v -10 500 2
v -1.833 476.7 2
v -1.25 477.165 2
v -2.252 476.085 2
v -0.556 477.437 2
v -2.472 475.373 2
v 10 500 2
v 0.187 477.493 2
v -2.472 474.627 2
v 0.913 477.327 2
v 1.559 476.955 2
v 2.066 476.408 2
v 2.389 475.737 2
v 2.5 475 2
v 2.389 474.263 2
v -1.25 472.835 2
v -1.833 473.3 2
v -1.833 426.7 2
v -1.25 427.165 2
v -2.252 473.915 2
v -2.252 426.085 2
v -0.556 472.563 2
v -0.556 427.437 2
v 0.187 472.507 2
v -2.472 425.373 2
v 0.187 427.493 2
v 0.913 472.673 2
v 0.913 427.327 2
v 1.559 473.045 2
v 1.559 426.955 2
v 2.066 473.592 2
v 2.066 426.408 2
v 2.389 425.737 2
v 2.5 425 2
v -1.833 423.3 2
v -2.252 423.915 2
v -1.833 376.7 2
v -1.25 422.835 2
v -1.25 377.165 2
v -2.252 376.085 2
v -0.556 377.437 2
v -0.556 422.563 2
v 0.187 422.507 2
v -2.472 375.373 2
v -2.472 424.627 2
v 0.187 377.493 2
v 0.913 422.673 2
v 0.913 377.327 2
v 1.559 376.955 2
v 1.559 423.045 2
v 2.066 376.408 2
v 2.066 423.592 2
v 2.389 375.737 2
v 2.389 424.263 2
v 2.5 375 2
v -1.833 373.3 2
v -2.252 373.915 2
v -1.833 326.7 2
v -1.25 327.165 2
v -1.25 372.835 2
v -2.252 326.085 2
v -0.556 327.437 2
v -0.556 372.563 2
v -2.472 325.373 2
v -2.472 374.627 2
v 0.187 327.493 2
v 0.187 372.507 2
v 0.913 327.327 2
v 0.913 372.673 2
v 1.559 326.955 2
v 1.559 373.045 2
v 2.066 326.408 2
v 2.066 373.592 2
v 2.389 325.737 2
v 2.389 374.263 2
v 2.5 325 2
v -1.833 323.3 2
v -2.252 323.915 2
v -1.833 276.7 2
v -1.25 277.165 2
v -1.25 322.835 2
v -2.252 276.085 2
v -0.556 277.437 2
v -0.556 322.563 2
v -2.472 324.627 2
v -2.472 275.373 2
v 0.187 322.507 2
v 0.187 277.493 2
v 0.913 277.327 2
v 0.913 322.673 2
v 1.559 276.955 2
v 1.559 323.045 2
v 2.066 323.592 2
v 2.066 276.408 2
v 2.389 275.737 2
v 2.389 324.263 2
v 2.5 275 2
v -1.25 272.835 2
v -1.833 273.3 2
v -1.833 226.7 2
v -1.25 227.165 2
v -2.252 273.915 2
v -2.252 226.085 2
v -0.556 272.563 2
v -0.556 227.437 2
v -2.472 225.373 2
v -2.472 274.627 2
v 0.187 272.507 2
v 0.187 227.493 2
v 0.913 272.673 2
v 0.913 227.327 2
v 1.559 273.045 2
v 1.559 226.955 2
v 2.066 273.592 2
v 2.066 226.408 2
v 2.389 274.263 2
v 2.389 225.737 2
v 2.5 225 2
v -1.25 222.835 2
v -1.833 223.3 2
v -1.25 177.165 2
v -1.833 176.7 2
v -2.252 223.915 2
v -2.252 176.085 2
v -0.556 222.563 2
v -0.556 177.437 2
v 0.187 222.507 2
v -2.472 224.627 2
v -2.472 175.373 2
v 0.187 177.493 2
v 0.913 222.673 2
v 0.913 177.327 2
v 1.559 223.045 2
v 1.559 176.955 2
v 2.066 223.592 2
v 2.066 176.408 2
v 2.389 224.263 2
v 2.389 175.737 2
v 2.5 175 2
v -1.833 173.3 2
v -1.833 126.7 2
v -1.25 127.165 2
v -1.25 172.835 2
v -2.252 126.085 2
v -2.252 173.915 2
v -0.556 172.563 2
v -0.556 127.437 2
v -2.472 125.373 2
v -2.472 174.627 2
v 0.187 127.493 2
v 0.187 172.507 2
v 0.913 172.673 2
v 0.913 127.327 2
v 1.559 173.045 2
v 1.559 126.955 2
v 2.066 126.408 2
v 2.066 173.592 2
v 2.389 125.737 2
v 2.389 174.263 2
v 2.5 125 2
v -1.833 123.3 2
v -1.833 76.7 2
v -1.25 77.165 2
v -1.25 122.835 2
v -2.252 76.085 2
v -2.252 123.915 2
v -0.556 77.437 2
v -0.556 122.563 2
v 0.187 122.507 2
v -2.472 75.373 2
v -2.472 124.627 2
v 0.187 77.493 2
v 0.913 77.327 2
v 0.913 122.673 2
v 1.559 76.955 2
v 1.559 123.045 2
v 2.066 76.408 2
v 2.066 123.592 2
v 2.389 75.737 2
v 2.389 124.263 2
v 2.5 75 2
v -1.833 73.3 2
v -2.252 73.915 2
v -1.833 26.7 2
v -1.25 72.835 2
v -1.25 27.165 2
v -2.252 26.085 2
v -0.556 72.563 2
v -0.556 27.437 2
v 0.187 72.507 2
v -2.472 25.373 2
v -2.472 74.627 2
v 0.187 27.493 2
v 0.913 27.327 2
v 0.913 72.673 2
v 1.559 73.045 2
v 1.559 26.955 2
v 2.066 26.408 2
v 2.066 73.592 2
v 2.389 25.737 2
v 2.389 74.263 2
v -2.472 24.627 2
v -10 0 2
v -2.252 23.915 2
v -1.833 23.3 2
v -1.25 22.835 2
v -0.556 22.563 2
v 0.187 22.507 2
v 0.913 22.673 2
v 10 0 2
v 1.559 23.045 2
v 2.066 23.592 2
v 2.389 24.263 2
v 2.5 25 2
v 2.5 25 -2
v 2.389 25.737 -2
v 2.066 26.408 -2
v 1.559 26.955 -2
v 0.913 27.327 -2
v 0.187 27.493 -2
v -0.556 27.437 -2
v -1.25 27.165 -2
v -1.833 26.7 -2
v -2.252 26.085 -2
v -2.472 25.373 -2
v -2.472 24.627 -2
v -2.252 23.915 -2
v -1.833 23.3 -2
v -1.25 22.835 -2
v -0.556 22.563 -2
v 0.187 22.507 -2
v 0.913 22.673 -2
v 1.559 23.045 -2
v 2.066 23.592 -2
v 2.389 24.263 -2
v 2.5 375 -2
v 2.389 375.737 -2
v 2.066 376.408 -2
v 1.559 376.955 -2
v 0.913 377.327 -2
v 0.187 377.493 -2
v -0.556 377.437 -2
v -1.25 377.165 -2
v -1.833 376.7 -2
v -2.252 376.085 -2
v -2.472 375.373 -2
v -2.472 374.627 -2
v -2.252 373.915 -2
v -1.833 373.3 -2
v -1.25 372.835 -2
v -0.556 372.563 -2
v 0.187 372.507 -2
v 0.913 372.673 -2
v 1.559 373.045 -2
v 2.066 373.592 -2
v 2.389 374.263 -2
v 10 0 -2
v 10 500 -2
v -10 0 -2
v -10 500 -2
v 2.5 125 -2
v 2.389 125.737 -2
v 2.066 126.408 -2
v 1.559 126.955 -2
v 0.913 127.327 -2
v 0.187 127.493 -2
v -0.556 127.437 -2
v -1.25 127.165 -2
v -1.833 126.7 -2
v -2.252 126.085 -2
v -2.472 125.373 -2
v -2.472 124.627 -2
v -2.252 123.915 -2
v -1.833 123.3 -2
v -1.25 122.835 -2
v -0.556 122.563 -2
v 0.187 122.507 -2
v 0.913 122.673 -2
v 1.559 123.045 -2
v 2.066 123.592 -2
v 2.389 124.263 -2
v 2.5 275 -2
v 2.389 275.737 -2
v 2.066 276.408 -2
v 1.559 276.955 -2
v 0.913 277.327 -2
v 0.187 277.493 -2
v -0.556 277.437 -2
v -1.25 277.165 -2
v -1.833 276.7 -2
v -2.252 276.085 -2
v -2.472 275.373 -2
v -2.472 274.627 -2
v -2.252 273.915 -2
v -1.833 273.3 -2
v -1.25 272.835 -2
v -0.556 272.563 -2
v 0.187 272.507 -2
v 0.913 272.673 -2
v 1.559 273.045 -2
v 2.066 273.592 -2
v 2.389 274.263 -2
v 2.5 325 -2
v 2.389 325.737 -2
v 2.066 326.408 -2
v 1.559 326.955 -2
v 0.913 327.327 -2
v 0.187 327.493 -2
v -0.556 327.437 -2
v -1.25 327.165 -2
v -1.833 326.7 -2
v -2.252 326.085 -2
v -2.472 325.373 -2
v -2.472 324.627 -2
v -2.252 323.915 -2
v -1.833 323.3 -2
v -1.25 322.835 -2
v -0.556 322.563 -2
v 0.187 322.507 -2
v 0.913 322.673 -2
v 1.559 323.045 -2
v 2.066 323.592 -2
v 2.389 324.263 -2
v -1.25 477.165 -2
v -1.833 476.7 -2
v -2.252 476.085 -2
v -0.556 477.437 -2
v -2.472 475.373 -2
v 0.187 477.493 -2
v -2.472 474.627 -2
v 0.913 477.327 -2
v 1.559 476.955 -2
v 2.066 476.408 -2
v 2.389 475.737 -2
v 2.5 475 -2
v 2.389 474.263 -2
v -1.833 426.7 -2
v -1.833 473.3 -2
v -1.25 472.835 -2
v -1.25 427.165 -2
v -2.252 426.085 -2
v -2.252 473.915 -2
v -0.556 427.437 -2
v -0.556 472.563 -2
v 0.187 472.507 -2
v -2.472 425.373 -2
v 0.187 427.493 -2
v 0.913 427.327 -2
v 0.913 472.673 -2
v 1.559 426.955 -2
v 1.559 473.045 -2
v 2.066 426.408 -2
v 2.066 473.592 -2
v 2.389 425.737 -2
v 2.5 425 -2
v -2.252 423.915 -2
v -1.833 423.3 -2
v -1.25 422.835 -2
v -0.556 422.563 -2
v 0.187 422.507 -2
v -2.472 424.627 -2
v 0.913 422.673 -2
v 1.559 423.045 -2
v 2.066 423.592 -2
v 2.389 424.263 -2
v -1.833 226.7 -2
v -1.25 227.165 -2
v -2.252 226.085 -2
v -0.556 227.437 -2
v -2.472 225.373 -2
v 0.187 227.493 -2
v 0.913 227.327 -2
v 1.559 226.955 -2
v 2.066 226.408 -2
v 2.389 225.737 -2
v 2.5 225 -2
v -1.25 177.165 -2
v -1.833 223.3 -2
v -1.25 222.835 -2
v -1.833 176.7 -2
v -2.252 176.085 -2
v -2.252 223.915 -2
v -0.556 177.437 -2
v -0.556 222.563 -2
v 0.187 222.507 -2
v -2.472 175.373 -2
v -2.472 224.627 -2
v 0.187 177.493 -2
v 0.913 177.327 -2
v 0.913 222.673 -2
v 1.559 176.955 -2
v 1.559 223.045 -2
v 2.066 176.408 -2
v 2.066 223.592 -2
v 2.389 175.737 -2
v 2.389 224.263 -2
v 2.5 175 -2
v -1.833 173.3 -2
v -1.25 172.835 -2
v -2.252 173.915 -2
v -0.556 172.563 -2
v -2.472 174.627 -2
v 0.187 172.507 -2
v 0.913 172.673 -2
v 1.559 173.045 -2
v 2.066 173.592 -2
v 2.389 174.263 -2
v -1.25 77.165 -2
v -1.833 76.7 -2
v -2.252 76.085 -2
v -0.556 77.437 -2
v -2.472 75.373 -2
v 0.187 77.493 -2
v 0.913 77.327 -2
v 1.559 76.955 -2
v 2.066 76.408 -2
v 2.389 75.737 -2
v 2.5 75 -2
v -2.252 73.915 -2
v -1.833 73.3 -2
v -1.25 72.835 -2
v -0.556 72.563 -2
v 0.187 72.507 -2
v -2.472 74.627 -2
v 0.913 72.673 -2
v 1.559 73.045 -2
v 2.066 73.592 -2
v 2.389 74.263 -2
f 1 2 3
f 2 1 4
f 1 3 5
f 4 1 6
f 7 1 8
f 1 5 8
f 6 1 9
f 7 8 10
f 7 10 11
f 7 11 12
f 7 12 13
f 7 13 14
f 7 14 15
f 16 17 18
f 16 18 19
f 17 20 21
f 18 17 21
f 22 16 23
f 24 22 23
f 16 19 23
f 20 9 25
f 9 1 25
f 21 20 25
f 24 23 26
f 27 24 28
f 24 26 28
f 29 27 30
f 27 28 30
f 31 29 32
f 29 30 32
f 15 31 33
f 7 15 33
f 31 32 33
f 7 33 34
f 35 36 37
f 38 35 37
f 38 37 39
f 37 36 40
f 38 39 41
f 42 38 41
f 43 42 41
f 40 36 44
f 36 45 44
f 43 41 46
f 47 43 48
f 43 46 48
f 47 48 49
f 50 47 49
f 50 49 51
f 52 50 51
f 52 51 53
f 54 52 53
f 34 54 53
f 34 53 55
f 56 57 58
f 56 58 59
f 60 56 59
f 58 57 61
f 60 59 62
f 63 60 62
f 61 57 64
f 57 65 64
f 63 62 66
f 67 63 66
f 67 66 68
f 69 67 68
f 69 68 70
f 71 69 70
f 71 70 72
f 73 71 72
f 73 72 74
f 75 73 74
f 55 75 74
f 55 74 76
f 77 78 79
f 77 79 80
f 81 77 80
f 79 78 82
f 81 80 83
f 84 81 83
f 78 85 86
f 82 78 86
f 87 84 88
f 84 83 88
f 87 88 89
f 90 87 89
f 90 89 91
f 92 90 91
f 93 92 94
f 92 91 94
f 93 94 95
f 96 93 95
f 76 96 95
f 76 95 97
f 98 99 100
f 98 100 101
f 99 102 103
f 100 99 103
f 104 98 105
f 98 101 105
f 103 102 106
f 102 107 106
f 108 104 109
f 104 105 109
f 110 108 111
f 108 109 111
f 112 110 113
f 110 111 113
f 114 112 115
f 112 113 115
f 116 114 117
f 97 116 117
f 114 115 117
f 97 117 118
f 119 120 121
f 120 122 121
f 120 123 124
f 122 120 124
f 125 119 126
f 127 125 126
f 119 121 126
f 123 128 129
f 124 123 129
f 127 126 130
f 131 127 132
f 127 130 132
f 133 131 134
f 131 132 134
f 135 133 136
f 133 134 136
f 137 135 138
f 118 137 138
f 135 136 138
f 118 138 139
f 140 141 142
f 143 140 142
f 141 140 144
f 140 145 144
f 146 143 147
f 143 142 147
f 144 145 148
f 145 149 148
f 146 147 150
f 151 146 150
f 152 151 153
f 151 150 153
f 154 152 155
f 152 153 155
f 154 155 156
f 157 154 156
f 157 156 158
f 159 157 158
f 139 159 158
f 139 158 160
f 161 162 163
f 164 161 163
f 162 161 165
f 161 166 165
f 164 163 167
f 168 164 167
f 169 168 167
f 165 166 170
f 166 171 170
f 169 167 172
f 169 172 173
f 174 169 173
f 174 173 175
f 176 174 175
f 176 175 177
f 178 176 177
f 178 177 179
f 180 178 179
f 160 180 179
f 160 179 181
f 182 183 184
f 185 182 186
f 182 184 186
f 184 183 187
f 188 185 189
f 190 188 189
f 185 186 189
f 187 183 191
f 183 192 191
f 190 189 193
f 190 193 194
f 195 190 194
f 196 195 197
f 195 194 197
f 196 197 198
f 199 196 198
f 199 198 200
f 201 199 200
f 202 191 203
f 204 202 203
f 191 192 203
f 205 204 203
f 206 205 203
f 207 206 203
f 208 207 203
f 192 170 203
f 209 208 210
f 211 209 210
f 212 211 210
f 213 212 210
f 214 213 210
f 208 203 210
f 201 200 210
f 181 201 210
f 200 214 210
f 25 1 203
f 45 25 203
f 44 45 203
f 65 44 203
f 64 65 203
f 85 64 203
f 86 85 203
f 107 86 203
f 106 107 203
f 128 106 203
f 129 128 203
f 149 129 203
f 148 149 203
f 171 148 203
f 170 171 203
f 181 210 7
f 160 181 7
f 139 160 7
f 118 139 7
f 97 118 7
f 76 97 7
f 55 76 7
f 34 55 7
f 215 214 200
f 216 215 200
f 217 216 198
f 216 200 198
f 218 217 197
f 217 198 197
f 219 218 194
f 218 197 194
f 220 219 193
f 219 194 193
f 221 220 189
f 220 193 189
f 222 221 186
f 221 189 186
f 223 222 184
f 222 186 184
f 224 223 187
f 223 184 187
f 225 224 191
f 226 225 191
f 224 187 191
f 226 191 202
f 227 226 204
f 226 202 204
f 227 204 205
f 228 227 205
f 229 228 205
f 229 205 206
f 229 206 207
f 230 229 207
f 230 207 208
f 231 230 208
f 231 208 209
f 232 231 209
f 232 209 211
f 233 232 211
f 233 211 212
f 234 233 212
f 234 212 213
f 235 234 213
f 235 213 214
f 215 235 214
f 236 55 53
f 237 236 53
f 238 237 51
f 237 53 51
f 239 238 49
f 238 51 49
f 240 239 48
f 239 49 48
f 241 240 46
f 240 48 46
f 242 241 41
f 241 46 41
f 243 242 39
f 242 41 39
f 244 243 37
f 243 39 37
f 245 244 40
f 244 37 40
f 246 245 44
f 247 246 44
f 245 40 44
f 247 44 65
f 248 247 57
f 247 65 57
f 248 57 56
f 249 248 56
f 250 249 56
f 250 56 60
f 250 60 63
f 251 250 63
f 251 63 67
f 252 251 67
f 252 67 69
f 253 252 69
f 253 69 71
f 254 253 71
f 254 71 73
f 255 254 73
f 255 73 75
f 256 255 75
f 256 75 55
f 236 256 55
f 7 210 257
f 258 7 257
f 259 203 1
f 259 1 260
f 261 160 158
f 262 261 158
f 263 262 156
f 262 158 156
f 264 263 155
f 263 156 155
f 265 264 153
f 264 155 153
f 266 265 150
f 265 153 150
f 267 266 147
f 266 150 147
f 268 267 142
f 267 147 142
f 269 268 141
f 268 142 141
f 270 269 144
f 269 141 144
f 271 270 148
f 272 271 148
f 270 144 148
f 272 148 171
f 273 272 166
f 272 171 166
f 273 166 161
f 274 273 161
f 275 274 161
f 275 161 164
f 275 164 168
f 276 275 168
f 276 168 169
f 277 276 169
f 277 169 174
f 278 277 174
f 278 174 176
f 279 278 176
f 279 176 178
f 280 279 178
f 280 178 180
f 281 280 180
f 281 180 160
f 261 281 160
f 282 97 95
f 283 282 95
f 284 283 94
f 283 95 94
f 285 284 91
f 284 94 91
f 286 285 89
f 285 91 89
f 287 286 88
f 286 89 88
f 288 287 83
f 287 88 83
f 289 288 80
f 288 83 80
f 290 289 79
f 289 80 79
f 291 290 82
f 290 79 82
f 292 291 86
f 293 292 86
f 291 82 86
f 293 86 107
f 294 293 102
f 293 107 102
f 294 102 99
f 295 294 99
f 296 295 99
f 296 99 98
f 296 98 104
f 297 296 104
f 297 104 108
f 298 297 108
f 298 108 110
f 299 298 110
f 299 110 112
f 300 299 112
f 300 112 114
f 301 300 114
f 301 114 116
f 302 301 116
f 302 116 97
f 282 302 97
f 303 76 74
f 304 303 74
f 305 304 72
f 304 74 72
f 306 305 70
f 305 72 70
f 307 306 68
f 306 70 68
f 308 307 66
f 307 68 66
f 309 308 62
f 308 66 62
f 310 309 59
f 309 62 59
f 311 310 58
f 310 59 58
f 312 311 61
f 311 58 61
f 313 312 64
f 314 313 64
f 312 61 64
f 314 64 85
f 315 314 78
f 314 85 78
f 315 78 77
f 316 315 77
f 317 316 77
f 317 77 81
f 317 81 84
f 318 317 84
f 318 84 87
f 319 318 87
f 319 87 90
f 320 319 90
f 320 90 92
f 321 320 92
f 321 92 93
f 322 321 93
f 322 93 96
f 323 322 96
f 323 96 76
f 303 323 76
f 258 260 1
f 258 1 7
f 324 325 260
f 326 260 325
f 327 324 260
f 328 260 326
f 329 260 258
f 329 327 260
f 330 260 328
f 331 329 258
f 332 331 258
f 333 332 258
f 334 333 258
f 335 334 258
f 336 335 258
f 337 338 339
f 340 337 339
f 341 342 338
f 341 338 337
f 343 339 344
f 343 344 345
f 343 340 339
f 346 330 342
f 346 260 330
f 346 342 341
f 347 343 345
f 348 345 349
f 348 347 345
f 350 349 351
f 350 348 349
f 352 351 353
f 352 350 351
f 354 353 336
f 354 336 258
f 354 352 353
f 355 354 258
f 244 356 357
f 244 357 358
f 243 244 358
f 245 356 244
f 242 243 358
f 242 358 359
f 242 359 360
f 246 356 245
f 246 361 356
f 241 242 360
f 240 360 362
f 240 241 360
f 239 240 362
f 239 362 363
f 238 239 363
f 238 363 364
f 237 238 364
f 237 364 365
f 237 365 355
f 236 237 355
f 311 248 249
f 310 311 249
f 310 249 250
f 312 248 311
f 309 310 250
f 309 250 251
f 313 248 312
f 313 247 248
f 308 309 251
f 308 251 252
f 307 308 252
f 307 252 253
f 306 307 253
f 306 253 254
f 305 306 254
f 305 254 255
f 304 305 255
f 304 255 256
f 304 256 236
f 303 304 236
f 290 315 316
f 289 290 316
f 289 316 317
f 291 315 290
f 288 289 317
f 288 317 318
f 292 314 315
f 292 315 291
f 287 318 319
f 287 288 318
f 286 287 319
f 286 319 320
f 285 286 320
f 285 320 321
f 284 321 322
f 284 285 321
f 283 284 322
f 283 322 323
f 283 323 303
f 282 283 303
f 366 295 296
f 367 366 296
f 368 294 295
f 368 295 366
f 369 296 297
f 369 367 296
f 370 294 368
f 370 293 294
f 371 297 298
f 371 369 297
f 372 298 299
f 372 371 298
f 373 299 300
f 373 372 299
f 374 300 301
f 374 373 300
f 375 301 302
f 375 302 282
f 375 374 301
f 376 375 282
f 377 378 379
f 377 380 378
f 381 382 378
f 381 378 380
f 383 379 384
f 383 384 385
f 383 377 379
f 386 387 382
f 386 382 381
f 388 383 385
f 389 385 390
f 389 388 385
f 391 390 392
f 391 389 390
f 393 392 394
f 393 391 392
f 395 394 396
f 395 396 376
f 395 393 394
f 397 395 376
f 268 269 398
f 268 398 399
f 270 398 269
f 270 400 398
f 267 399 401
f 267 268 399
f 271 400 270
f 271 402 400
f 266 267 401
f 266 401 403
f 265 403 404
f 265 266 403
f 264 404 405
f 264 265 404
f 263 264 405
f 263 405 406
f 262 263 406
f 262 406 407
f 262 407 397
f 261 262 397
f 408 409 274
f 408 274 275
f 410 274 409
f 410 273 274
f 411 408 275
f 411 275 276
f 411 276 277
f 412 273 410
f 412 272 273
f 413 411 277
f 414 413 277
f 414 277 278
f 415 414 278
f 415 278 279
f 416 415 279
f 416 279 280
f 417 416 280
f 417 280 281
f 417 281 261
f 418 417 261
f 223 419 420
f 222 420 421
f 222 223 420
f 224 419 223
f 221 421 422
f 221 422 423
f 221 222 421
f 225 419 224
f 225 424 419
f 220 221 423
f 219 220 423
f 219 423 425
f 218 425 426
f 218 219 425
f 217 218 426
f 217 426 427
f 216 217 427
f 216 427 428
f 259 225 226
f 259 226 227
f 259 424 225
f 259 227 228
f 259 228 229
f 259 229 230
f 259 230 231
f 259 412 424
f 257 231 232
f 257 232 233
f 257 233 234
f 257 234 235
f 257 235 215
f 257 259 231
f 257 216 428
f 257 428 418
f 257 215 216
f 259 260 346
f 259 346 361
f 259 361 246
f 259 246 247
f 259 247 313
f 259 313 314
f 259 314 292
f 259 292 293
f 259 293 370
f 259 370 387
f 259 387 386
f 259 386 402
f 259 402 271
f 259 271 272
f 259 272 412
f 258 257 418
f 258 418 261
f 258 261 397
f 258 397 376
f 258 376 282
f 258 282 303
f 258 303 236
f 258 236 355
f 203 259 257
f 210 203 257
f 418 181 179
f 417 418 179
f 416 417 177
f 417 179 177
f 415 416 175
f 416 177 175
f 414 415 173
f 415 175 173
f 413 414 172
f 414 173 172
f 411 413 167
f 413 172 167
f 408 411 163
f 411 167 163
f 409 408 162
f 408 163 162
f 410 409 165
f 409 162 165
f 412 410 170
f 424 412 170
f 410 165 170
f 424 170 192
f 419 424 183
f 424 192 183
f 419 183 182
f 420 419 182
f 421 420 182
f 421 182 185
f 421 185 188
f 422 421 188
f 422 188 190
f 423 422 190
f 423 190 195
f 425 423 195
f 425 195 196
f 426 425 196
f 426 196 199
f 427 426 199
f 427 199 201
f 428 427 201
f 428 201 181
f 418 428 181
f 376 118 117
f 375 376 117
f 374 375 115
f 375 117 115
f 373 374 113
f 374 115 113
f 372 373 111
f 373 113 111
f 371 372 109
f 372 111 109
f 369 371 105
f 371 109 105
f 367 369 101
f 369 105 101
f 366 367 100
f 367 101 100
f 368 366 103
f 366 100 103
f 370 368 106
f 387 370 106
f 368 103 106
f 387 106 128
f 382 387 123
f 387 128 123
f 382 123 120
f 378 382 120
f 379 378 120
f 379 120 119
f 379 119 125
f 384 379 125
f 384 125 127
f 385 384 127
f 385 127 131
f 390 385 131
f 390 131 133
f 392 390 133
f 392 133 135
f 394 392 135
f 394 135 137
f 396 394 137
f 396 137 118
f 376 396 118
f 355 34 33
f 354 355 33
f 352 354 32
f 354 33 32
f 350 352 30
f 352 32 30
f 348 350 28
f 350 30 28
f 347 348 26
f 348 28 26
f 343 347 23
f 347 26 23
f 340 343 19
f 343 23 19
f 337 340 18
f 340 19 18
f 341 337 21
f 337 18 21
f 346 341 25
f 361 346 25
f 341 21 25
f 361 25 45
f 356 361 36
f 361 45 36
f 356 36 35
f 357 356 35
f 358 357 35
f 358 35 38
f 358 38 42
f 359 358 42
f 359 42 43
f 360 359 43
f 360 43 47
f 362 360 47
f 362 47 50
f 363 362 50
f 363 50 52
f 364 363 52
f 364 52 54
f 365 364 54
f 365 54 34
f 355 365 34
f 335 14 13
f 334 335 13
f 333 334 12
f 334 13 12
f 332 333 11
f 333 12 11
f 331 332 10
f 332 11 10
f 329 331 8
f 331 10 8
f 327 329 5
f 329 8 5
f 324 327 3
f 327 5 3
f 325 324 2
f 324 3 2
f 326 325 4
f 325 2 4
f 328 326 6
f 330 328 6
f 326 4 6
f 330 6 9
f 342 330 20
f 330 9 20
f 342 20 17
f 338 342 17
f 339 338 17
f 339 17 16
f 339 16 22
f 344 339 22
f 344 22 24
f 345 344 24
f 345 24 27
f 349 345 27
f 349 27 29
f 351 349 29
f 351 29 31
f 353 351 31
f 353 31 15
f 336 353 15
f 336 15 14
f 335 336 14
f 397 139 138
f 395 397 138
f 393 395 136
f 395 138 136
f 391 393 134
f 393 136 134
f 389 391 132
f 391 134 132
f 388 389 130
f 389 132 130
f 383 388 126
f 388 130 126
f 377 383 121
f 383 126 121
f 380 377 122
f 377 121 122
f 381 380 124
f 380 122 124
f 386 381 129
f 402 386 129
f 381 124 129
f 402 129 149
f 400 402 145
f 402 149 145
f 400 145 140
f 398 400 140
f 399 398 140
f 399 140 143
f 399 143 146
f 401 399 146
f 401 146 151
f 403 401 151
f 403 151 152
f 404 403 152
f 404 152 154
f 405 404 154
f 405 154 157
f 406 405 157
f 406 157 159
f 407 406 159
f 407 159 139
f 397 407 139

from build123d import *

# Parameters (mm, degrees)
SKETCH_1_W          = 20
SKETCH_1_H          = 4
EXTRUDE_1_DEPTH     = 500
SKETCH_2_R          = 2.5
CUT_EXTRUDE_1_DEPTH = 5


with BuildPart() as part:
    # Эскиз1 → Бобышка-Вытянуть1 (new body)
    with BuildSketch(Plane(origin=(0, 0, 0), x_dir=(1, 0, 0), z_dir=(0, 1, 0))):
        Rectangle(SKETCH_1_W, SKETCH_1_H)
    extrude(amount=EXTRUDE_1_DEPTH)

    # Эскиз2 → Вырез-Вытянуть1 (cut, through all)
    with BuildSketch(Plane.XY.offset(2)):
        with Locations((0, 25)):
            Circle(SKETCH_2_R)
        with Locations((0, 75)):
            Circle(SKETCH_2_R)
        with Locations((0, 125)):
            Circle(SKETCH_2_R)
        with Locations((0, 175)):
            Circle(SKETCH_2_R)
        with Locations((0, 225)):
            Circle(SKETCH_2_R)
        with Locations((0, 275)):
            Circle(SKETCH_2_R)
        with Locations((0, 325)):
            Circle(SKETCH_2_R)
        with Locations((0, 375)):
            Circle(SKETCH_2_R)
        with Locations((0, 425)):
            Circle(SKETCH_2_R)
        with Locations((0, 475)):
            Circle(SKETCH_2_R)
    extrude(amount=-CUT_EXTRUDE_1_DEPTH, mode=Mode.SUBTRACT)


solid = part.part
